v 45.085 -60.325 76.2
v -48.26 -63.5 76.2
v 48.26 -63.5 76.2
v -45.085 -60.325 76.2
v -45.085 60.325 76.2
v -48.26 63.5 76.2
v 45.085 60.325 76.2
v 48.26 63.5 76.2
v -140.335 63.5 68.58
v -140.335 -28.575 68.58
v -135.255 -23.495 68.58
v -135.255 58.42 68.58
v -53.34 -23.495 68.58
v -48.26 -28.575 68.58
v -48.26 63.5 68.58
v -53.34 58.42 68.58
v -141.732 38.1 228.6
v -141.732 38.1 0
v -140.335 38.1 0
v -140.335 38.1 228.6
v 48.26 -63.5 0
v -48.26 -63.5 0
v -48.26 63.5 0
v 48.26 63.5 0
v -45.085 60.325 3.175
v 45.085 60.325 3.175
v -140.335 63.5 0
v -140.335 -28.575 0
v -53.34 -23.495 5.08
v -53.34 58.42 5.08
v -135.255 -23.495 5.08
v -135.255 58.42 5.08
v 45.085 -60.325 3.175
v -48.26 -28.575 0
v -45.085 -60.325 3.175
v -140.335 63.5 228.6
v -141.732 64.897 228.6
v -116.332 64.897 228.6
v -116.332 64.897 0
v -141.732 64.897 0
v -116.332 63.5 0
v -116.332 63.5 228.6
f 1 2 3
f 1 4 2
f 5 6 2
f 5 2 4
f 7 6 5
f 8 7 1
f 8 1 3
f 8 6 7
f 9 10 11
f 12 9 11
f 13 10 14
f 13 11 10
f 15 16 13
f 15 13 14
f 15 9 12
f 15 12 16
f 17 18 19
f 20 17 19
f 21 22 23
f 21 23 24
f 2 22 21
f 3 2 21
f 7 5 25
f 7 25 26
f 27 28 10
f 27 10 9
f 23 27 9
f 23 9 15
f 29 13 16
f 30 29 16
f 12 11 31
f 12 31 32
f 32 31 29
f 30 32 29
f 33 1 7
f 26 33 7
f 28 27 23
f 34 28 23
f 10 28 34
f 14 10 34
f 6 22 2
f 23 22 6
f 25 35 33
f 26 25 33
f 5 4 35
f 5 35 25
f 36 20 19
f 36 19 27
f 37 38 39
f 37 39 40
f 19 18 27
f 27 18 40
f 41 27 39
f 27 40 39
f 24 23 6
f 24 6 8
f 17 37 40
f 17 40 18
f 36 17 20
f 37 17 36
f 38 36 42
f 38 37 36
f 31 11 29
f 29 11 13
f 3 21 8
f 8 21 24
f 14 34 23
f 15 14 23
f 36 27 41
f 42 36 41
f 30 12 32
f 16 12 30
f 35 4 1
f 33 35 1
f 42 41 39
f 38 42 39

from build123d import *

# Parameters (mm, degrees)
F0_W     = 96.52
F0_H     = 127
F1_DEPTH = 76.2
F2_W     = 90.17
F2_H     = 120.65
F3_DEPTH = 73.025
F4_W     = 92.075
F4_H     = 92.075
F5_DEPTH = 68.58
F6_W     = 81.915
F6_H     = 81.915
F7_DEPTH = 63.5
F8_W     = 1.397
F8_H     = 25.4
F9_DEPTH = 228.6


with BuildPart() as f1:
    # F0 (on Top) → F1 (new body)
    with BuildSketch(Plane.XY):
        Rectangle(F0_W, F0_H)
    extrude(amount=F1_DEPTH)

    # F2 (on face) → F3 (cut)
    with BuildSketch(Plane.XY.offset(76.2)):
        Rectangle(F2_W, F2_H)
    extrude(amount=-F3_DEPTH, mode=Mode.SUBTRACT)


with BuildPart() as f5:
    # F4 (on Top) → F5 (new body)
    with BuildSketch(Plane.XY):
        with Locations((-94.2975, 17.4625)):
            Rectangle(F4_W, F4_H)
    extrude(amount=F5_DEPTH)

    # F6 (on face) → F7 (cut)
    with BuildSketch(Plane.XY.offset(68.58)):
        with Locations((-94.2975, 17.4625)):
            Rectangle(F6_W, F6_H)
    extrude(amount=-F7_DEPTH, mode=Mode.SUBTRACT)


with BuildPart() as f9:
    # F8 (on Top) → F9 (new body)
    with BuildSketch(Plane.XY):
        with Locations((-141.0335, 50.8)):
            Rectangle(F8_W, F8_H)
        Polygon((-141.732, 63.5), (-140.335, 63.5), (-116.332, 63.5), (-116.332, 64.897), (-141.732, 64.897), align=None)
    extrude(amount=F9_DEPTH)


solid = Compound([f1.part, f5.part, f9.part])
